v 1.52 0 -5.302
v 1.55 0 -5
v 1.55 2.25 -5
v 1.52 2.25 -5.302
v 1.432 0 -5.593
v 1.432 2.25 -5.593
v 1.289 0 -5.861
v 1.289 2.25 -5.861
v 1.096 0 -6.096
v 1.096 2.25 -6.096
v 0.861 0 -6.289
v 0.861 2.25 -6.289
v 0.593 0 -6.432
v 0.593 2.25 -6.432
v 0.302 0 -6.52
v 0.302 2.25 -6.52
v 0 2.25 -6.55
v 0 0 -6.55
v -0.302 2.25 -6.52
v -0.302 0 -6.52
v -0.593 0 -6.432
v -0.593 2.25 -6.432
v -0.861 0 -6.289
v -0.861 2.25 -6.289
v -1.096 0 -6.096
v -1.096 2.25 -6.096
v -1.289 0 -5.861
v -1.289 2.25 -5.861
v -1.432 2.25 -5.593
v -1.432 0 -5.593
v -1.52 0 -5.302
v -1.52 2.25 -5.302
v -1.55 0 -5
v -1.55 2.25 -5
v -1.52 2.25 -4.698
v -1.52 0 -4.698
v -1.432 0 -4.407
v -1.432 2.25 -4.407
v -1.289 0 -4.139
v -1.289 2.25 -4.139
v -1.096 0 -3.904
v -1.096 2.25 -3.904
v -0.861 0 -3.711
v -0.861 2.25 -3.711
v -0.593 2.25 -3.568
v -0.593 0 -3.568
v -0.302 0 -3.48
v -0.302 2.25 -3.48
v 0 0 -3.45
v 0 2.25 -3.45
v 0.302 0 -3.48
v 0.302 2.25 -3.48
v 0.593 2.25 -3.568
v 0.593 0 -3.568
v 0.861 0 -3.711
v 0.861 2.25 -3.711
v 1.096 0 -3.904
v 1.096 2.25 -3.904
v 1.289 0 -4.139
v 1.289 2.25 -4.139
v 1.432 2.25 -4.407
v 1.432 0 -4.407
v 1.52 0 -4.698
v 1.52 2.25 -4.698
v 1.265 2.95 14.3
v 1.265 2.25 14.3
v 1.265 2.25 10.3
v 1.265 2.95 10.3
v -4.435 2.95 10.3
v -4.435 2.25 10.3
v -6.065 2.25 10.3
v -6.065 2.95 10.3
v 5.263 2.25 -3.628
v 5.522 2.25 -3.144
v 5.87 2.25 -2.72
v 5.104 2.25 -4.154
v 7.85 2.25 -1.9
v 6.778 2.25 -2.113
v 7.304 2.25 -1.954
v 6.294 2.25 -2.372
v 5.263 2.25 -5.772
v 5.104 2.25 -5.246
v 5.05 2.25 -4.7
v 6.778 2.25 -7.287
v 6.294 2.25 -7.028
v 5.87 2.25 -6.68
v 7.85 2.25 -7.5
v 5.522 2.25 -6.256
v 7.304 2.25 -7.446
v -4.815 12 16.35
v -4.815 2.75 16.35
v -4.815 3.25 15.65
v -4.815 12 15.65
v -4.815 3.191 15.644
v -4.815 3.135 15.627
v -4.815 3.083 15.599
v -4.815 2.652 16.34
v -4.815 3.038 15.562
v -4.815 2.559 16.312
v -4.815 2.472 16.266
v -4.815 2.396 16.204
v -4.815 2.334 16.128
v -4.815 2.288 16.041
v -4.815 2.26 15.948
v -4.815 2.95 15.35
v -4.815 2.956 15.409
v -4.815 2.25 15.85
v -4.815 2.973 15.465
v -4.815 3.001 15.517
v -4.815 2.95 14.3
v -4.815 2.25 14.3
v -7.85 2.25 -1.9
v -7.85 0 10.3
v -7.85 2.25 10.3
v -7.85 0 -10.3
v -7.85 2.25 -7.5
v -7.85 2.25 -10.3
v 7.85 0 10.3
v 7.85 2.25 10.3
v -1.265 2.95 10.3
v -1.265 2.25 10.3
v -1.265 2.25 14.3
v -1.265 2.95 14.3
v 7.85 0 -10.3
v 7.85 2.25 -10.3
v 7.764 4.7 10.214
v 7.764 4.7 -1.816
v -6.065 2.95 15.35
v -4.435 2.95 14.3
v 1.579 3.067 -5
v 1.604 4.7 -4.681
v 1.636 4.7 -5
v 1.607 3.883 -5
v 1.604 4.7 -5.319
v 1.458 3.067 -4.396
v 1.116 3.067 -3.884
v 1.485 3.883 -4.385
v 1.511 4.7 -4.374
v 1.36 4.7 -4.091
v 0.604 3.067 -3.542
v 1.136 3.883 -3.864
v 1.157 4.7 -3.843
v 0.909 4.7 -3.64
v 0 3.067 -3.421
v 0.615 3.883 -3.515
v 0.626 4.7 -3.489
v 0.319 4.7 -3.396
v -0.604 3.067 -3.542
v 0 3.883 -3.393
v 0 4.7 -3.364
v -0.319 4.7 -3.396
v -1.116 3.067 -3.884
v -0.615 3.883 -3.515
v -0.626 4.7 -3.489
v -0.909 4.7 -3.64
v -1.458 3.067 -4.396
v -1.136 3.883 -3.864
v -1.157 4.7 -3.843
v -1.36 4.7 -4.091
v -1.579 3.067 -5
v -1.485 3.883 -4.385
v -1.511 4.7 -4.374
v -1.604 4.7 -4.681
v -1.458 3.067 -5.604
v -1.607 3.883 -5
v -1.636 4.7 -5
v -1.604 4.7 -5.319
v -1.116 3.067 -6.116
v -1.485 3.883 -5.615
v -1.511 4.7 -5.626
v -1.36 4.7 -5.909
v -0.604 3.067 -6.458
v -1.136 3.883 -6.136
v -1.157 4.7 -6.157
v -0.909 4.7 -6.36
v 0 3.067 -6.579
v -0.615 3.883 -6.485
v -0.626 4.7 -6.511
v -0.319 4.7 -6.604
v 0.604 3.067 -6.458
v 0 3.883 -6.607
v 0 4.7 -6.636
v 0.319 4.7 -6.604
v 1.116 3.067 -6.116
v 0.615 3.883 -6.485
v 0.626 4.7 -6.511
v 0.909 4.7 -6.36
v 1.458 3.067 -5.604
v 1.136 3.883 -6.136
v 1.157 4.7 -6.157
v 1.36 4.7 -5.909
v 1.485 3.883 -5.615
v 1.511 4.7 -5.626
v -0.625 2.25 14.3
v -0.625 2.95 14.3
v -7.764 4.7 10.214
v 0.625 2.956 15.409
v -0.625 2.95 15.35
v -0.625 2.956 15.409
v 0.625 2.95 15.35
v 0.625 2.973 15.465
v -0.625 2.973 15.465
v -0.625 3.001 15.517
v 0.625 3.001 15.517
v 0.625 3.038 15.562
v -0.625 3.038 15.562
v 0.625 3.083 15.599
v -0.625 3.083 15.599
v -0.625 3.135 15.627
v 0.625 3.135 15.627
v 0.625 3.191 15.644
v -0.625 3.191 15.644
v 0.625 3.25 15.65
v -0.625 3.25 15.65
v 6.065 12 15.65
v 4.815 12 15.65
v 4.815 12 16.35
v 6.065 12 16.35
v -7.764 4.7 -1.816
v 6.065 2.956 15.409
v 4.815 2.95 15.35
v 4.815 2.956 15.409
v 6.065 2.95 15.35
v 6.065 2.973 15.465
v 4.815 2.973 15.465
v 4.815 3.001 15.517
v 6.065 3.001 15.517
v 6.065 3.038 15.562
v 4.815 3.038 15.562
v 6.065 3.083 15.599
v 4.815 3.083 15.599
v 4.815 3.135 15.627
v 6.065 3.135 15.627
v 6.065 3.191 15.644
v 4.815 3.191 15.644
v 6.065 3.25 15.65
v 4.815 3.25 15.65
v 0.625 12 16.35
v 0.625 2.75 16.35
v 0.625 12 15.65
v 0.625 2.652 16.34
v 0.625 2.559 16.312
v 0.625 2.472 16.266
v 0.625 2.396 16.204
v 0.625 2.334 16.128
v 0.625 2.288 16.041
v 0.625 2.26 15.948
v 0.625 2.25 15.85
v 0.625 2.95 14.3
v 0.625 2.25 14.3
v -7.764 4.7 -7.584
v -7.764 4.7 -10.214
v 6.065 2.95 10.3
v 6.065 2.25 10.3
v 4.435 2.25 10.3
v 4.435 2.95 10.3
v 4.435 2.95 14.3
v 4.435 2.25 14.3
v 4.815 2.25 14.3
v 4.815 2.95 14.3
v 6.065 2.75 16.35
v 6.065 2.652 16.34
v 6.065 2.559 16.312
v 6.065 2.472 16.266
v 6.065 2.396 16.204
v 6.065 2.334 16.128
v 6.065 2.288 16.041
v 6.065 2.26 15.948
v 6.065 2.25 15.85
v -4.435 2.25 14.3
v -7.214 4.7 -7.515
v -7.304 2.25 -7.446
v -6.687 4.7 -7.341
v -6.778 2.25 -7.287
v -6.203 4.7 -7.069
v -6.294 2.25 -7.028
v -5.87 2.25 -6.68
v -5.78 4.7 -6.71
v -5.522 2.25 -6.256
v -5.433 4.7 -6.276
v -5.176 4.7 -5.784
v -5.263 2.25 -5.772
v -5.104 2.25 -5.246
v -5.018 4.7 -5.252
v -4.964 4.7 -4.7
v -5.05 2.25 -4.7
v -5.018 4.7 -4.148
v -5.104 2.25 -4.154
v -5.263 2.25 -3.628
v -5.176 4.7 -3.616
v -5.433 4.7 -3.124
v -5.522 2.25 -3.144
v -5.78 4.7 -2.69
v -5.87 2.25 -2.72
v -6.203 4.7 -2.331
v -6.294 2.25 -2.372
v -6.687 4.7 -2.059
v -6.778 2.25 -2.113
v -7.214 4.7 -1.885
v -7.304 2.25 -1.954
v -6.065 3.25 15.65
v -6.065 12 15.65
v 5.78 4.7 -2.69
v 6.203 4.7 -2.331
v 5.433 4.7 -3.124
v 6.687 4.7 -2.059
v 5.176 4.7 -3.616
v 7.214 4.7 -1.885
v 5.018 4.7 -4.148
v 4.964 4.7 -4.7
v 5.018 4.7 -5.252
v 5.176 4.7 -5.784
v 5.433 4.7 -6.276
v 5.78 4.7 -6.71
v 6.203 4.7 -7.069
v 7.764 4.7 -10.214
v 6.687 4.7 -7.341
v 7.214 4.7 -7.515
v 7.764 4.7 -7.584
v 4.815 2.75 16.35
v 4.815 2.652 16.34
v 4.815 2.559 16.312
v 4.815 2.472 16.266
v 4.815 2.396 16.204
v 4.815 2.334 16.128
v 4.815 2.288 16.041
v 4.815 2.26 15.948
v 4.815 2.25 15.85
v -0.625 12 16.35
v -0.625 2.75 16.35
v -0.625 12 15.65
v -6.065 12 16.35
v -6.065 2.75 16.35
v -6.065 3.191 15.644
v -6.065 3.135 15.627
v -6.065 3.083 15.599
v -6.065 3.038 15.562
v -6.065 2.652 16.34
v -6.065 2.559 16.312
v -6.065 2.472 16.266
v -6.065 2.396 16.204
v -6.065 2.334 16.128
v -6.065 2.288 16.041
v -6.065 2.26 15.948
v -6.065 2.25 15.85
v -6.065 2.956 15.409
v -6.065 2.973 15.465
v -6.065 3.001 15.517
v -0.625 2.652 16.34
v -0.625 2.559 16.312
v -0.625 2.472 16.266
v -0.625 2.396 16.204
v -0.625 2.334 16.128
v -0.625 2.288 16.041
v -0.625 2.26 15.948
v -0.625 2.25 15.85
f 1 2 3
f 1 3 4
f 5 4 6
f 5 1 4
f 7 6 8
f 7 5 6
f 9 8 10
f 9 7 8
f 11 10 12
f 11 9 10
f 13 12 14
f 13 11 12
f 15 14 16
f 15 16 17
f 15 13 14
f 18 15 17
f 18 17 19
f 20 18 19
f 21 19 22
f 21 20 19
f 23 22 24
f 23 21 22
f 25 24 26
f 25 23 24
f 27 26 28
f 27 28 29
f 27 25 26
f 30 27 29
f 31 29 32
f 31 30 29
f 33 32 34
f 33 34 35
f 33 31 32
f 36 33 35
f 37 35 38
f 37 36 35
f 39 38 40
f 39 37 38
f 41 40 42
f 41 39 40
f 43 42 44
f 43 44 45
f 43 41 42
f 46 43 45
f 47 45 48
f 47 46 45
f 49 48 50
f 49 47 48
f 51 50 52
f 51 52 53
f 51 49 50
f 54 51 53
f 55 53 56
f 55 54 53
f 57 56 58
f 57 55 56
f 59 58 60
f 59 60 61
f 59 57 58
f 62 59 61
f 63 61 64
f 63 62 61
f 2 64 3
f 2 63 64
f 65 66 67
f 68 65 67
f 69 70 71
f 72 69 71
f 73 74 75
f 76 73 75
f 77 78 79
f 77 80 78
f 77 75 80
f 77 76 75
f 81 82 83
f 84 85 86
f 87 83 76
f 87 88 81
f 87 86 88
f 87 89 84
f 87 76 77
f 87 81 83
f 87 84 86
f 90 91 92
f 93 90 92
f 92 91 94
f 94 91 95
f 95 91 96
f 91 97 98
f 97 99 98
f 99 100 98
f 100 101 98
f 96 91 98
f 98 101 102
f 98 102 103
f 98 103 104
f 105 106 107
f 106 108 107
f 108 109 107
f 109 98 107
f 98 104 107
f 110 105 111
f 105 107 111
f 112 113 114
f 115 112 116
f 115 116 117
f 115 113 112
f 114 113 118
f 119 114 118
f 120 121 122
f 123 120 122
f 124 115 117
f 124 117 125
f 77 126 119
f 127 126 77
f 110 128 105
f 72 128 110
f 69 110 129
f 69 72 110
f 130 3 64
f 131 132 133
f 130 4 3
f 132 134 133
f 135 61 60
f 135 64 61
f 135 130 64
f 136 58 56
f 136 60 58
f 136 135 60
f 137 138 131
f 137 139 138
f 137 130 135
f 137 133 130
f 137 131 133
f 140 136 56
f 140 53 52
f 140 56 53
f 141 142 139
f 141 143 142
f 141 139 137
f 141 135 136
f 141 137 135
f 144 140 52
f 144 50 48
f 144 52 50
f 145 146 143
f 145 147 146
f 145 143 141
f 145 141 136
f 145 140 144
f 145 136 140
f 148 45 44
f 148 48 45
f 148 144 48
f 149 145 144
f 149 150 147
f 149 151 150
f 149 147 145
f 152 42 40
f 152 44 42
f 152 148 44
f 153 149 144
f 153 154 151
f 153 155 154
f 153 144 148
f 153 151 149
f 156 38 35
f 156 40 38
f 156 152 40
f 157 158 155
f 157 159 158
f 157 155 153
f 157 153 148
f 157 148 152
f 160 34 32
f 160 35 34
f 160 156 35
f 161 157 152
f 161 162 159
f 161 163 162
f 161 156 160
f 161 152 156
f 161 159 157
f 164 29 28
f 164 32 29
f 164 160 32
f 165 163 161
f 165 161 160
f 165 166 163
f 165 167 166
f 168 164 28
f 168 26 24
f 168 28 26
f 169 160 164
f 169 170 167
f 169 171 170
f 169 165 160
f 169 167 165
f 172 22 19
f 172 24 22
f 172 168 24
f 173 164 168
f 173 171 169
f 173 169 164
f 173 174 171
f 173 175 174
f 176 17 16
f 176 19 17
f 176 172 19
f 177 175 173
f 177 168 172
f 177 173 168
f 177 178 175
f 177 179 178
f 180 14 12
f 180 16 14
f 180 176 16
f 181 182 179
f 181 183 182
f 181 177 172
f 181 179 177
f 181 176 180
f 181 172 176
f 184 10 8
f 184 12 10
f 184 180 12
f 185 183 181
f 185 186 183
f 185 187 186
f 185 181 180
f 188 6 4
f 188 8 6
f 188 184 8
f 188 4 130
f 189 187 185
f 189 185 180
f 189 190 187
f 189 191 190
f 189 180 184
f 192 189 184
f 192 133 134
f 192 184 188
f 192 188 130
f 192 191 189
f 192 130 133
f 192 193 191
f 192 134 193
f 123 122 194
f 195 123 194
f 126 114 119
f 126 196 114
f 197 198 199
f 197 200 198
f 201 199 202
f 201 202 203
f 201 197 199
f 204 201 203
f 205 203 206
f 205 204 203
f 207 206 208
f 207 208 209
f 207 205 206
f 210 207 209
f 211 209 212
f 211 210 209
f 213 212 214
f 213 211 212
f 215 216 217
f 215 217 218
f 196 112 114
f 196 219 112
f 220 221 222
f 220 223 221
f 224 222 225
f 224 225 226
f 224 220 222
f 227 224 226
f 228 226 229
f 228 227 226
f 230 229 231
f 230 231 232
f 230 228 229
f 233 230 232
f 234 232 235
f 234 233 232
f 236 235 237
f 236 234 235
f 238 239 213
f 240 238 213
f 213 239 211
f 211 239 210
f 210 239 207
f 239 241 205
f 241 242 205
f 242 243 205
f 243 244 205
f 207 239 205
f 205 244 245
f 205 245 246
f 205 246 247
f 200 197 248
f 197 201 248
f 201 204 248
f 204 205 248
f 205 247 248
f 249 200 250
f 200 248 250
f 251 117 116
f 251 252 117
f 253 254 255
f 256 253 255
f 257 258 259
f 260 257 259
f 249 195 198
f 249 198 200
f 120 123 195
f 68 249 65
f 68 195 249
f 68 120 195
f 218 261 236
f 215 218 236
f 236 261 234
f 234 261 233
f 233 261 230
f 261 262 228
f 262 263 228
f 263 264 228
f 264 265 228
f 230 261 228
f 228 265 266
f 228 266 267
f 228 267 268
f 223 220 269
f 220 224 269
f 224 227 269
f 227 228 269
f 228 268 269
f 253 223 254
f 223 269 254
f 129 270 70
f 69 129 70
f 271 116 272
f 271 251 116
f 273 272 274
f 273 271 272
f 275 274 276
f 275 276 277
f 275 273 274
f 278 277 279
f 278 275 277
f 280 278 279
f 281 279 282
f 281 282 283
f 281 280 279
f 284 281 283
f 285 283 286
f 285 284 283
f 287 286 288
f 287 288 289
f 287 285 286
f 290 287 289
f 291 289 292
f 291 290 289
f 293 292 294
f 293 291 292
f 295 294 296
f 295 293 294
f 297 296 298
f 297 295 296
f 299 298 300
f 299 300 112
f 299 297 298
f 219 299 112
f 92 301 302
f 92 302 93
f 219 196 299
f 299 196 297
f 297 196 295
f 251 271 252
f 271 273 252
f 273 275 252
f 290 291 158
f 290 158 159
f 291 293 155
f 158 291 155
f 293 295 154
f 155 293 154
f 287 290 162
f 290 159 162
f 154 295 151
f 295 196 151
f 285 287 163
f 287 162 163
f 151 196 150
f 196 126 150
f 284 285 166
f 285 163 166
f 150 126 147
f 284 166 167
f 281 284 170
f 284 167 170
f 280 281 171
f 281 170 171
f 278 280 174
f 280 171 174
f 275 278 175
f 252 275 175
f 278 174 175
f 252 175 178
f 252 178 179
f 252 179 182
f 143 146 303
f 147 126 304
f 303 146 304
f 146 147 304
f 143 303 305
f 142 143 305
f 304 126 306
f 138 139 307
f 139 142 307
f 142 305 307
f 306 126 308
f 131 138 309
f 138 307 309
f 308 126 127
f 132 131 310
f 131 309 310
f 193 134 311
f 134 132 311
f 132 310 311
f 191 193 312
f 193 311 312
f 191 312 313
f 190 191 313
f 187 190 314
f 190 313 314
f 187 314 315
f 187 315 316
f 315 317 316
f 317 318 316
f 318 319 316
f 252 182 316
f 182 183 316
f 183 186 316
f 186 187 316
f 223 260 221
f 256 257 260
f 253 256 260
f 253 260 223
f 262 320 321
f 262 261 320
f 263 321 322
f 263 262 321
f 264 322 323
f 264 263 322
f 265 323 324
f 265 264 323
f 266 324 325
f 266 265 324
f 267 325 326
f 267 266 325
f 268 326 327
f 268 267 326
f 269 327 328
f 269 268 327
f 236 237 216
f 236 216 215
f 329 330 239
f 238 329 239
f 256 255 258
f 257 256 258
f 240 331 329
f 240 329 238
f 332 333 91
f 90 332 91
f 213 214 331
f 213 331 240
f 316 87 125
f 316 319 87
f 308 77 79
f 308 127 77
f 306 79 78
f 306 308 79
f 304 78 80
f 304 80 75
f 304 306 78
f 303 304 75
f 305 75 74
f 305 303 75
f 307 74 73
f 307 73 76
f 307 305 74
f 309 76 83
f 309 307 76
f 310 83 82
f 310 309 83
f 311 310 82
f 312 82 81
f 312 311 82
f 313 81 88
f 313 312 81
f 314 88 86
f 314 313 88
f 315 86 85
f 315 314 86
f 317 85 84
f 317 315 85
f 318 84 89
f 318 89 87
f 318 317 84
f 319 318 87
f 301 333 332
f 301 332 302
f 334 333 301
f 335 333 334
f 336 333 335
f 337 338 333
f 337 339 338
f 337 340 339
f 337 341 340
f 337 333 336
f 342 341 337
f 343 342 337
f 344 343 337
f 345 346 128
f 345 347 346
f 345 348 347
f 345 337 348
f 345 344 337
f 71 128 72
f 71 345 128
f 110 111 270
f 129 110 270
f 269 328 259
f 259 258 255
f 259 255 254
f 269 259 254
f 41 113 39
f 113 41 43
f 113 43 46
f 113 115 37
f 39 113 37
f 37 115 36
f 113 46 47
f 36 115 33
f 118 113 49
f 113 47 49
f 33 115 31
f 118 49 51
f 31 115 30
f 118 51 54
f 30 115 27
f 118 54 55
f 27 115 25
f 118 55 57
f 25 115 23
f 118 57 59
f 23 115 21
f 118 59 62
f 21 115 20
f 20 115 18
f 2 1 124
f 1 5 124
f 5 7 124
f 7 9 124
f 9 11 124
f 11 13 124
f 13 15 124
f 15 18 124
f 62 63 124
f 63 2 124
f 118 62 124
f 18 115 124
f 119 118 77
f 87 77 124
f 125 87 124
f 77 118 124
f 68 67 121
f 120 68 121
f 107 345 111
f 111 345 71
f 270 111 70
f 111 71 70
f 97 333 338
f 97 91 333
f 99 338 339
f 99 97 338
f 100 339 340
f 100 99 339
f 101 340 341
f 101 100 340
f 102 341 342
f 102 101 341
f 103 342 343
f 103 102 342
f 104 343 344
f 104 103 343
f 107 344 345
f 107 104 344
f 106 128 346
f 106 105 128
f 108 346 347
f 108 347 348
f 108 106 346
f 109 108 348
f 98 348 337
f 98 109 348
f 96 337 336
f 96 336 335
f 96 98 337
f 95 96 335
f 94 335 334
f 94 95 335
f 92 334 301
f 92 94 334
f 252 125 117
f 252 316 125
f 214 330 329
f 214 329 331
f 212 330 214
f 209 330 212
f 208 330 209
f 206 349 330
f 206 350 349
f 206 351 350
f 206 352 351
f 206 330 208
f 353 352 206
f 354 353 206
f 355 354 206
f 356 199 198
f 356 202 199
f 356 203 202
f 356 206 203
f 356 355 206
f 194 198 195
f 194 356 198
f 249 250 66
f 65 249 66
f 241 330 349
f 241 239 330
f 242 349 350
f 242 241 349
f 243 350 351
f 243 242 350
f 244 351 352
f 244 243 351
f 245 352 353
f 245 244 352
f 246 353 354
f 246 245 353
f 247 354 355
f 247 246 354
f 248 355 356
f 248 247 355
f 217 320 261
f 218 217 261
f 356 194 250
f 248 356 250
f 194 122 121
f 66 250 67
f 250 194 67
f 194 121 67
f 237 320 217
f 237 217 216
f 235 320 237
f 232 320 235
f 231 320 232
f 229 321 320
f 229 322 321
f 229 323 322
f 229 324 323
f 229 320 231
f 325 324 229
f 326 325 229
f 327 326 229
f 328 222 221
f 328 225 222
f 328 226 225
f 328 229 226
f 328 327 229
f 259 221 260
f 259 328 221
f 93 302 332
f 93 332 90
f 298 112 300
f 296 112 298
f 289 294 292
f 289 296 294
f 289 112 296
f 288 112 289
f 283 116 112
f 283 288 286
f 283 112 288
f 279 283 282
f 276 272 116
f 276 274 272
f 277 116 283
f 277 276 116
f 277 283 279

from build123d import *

# Parameters (mm, degrees)
SKETCH_1_W        = 15.7
SKETCH_1_H        = 20.6
SKETCH_1_R        = 1.55
EXTRUDE_1_DEPTH   = 2.25
SKETCH_2_R        = 1.55
EXTRUDE_2_DEPTH   = 2.45
EXTRUDE_2_DRAFT   = 2
EXTRUDE_3_DEPTH   = 0.7
EXTRUDE_3_2_DEPTH = 0.7
EXTRUDE_3_3_DEPTH = 0.7
SKETCH_3_W        = 1.25
SKETCH_3_H        = 0.7
EXTRUDE_4_DEPTH   = 9.05
FILLET_1_R        = 0.3
FILLET_2_R        = 0.3
FILLET_3_R        = 0.3
FILLET_4_R        = 0.5
FILLET_5_R        = 0.5
FILLET_6_R        = 0.5


with BuildPart() as part:
    # Эскиз1 → Бобышка-Вытянуть1 (new body)
    with BuildSketch(Plane(origin=(0, 0, 0), x_dir=(1, 0, 0), z_dir=(0, 1, 0))):
        Rectangle(SKETCH_1_W, SKETCH_1_H)
        with Locations((0, 5)):
            Circle(SKETCH_1_R, mode=Mode.SUBTRACT)
    extrude(amount=EXTRUDE_1_DEPTH)


with BuildPart() as extrude_2_tool:
    # Эскиз2 → Бобышка-Вытянуть2 (with draft: the straight prism first)
    with BuildSketch(Plane(origin=(0, 2.25, 0), x_dir=(1, 0, 0), z_dir=(0, 1, 0))):
        with BuildLine():
            ThreePointArc((-7.85, 7.5), (-5.05, 4.7), (-7.85, 1.9))
            Line((-7.85, 1.9), (-7.85, -10.3))
            Line((-7.85, -10.3), (-6.065, -10.3))
            Line((-6.065, -10.3), (-4.435, -10.3))
            Line((-4.435, -10.3), (-1.265, -10.3))
            Line((-1.265, -10.3), (1.265, -10.3))
            Line((1.265, -10.3), (4.435, -10.3))
            Line((4.435, -10.3), (6.065, -10.3))
            Line((6.065, -10.3), (7.85, -10.3))
            Line((7.85, -10.3), (7.85, 1.9))
            ThreePointArc((7.85, 1.9), (5.05, 4.7), (7.85, 7.5))
            Line((7.85, 7.5), (7.85, 10.3))
            Line((7.85, 10.3), (-7.85, 10.3))
            Line((-7.85, 10.3), (-7.85, 7.5))
        make_face()
        with Locations((0, 5)):
            Circle(SKETCH_2_R, mode=Mode.SUBTRACT)
    extrude(amount=EXTRUDE_2_DEPTH)
    # Бобышка-Вытянуть2: the draft: its side faces are tilted about the plane it starts from
    extrude_2_sides = [extrude_2_tool.faces().sort_by_distance(p)[0] for p in [
        (-5.05, 3.475, -4.7),
        (-1.55, 3.475, -5),
        (0, 3.475, -10.3),
        (7.85, 3.475, -8.9),
        (5.05, 3.475, -4.7),
        (7.85, 3.475, 4.2),
        (0, 3.475, 10.3),
        (-7.85, 3.475, 4.2),
        (-7.85, 3.475, -8.9),
    ]]
    draft(extrude_2_sides, Plane(origin=(0, 2.25, 0), x_dir=(1, 0, 0), z_dir=(0, 1, 0)), EXTRUDE_2_DRAFT)


with BuildPart() as part_1:
    add(part.part)

    # Бобышка-Вытянуть2: add extrude_2_tool
    add(extrude_2_tool.part)


with BuildPart() as body_2:
    # Эскиз2<4> → Бобышка-Вытянуть3 (new body)
    with BuildSketch(Plane(origin=(0, 2.25, 0), x_dir=(1, 0, 0), z_dir=(0, 1, 0))):
        Polygon((-4.435, -10.3), (-6.065, -10.3), (-6.065, -16.35), (-4.815, -16.35), (-4.815, -14.3), (-4.435, -14.3), align=None)
    extrude(amount=EXTRUDE_3_DEPTH)



with BuildPart() as body_3:
    # Эскиз2<4> → Extrude 3 2 (new body)
    with BuildSketch(Plane(origin=(0, 2.25, 0), x_dir=(1, 0, 0), z_dir=(0, 1, 0))):
        Polygon((1.265, -10.3), (-1.265, -10.3), (-1.265, -14.3), (-0.625, -14.3), (-0.625, -16.35), (0.625, -16.35), (0.625, -14.3), (1.265, -14.3), align=None)
    extrude(amount=EXTRUDE_3_2_DEPTH)


with BuildPart() as body_4:
    # Эскиз2<4> → Extrude 3 3 (new body)
    with BuildSketch(Plane(origin=(0, 2.25, 0), x_dir=(1, 0, 0), z_dir=(0, 1, 0))):
        Polygon((6.065, -10.3), (4.435, -10.3), (4.435, -14.3), (4.815, -14.3), (4.815, -16.35), (6.065, -16.35), align=None)
    extrude(amount=EXTRUDE_3_3_DEPTH)


with BuildPart() as body_2_1:
    add(body_2.part)

    add(body_3.part)  # Бобышка-Вытянуть4 merges body 3

    add(body_4.part)  # Бобышка-Вытянуть4 merges body 4
    # Эскиз3 → Бобышка-Вытянуть4 (add)
    with BuildSketch(Plane(origin=(0, 2.95, 0), x_dir=(1, 0, 0), z_dir=(0, 1, 0))):
        with Locations((-5.44, -16)):
            Rectangle(SKETCH_3_W, SKETCH_3_H)
        with Locations((0, -16)):
            Rectangle(SKETCH_3_W, SKETCH_3_H)
        with Locations((5.44, -16)):
            Rectangle(SKETCH_3_W, SKETCH_3_H)
    extrude(amount=EXTRUDE_4_DEPTH)

    # Скругление1
    fillet_1_edges = [body_2_1.edges().sort_by_distance(p)[0] for p in [
        (5.44, 2.95, 15.65),
    ]]
    fillet(fillet_1_edges, radius=FILLET_1_R)

    # Скругление2
    fillet_2_edges = [body_2_1.edges().sort_by_distance(p)[0] for p in [
        (0, 2.95, 15.65),
    ]]
    fillet(fillet_2_edges, radius=FILLET_2_R)

    # Скругление3
    fillet_3_edges = [body_2_1.edges().sort_by_distance(p)[0] for p in [
        (-5.44, 2.95, 15.65),
    ]]
    fillet(fillet_3_edges, radius=FILLET_3_R)

    # Скругление4
    fillet_4_edges = [body_2_1.edges().sort_by_distance(p)[0] for p in [
        (5.44, 2.25, 16.35),
    ]]
    fillet(fillet_4_edges, radius=FILLET_4_R)

    # Скругление5
    fillet_5_edges = [body_2_1.edges().sort_by_distance(p)[0] for p in [
        (0, 2.25, 16.35),
    ]]
    fillet(fillet_5_edges, radius=FILLET_5_R)

    # Скругление6
    fillet_6_edges = [body_2_1.edges().sort_by_distance(p)[0] for p in [
        (-5.44, 2.25, 16.35),
    ]]
    fillet(fillet_6_edges, radius=FILLET_6_R)


solid = Compound([part_1.part, body_2_1.part])
